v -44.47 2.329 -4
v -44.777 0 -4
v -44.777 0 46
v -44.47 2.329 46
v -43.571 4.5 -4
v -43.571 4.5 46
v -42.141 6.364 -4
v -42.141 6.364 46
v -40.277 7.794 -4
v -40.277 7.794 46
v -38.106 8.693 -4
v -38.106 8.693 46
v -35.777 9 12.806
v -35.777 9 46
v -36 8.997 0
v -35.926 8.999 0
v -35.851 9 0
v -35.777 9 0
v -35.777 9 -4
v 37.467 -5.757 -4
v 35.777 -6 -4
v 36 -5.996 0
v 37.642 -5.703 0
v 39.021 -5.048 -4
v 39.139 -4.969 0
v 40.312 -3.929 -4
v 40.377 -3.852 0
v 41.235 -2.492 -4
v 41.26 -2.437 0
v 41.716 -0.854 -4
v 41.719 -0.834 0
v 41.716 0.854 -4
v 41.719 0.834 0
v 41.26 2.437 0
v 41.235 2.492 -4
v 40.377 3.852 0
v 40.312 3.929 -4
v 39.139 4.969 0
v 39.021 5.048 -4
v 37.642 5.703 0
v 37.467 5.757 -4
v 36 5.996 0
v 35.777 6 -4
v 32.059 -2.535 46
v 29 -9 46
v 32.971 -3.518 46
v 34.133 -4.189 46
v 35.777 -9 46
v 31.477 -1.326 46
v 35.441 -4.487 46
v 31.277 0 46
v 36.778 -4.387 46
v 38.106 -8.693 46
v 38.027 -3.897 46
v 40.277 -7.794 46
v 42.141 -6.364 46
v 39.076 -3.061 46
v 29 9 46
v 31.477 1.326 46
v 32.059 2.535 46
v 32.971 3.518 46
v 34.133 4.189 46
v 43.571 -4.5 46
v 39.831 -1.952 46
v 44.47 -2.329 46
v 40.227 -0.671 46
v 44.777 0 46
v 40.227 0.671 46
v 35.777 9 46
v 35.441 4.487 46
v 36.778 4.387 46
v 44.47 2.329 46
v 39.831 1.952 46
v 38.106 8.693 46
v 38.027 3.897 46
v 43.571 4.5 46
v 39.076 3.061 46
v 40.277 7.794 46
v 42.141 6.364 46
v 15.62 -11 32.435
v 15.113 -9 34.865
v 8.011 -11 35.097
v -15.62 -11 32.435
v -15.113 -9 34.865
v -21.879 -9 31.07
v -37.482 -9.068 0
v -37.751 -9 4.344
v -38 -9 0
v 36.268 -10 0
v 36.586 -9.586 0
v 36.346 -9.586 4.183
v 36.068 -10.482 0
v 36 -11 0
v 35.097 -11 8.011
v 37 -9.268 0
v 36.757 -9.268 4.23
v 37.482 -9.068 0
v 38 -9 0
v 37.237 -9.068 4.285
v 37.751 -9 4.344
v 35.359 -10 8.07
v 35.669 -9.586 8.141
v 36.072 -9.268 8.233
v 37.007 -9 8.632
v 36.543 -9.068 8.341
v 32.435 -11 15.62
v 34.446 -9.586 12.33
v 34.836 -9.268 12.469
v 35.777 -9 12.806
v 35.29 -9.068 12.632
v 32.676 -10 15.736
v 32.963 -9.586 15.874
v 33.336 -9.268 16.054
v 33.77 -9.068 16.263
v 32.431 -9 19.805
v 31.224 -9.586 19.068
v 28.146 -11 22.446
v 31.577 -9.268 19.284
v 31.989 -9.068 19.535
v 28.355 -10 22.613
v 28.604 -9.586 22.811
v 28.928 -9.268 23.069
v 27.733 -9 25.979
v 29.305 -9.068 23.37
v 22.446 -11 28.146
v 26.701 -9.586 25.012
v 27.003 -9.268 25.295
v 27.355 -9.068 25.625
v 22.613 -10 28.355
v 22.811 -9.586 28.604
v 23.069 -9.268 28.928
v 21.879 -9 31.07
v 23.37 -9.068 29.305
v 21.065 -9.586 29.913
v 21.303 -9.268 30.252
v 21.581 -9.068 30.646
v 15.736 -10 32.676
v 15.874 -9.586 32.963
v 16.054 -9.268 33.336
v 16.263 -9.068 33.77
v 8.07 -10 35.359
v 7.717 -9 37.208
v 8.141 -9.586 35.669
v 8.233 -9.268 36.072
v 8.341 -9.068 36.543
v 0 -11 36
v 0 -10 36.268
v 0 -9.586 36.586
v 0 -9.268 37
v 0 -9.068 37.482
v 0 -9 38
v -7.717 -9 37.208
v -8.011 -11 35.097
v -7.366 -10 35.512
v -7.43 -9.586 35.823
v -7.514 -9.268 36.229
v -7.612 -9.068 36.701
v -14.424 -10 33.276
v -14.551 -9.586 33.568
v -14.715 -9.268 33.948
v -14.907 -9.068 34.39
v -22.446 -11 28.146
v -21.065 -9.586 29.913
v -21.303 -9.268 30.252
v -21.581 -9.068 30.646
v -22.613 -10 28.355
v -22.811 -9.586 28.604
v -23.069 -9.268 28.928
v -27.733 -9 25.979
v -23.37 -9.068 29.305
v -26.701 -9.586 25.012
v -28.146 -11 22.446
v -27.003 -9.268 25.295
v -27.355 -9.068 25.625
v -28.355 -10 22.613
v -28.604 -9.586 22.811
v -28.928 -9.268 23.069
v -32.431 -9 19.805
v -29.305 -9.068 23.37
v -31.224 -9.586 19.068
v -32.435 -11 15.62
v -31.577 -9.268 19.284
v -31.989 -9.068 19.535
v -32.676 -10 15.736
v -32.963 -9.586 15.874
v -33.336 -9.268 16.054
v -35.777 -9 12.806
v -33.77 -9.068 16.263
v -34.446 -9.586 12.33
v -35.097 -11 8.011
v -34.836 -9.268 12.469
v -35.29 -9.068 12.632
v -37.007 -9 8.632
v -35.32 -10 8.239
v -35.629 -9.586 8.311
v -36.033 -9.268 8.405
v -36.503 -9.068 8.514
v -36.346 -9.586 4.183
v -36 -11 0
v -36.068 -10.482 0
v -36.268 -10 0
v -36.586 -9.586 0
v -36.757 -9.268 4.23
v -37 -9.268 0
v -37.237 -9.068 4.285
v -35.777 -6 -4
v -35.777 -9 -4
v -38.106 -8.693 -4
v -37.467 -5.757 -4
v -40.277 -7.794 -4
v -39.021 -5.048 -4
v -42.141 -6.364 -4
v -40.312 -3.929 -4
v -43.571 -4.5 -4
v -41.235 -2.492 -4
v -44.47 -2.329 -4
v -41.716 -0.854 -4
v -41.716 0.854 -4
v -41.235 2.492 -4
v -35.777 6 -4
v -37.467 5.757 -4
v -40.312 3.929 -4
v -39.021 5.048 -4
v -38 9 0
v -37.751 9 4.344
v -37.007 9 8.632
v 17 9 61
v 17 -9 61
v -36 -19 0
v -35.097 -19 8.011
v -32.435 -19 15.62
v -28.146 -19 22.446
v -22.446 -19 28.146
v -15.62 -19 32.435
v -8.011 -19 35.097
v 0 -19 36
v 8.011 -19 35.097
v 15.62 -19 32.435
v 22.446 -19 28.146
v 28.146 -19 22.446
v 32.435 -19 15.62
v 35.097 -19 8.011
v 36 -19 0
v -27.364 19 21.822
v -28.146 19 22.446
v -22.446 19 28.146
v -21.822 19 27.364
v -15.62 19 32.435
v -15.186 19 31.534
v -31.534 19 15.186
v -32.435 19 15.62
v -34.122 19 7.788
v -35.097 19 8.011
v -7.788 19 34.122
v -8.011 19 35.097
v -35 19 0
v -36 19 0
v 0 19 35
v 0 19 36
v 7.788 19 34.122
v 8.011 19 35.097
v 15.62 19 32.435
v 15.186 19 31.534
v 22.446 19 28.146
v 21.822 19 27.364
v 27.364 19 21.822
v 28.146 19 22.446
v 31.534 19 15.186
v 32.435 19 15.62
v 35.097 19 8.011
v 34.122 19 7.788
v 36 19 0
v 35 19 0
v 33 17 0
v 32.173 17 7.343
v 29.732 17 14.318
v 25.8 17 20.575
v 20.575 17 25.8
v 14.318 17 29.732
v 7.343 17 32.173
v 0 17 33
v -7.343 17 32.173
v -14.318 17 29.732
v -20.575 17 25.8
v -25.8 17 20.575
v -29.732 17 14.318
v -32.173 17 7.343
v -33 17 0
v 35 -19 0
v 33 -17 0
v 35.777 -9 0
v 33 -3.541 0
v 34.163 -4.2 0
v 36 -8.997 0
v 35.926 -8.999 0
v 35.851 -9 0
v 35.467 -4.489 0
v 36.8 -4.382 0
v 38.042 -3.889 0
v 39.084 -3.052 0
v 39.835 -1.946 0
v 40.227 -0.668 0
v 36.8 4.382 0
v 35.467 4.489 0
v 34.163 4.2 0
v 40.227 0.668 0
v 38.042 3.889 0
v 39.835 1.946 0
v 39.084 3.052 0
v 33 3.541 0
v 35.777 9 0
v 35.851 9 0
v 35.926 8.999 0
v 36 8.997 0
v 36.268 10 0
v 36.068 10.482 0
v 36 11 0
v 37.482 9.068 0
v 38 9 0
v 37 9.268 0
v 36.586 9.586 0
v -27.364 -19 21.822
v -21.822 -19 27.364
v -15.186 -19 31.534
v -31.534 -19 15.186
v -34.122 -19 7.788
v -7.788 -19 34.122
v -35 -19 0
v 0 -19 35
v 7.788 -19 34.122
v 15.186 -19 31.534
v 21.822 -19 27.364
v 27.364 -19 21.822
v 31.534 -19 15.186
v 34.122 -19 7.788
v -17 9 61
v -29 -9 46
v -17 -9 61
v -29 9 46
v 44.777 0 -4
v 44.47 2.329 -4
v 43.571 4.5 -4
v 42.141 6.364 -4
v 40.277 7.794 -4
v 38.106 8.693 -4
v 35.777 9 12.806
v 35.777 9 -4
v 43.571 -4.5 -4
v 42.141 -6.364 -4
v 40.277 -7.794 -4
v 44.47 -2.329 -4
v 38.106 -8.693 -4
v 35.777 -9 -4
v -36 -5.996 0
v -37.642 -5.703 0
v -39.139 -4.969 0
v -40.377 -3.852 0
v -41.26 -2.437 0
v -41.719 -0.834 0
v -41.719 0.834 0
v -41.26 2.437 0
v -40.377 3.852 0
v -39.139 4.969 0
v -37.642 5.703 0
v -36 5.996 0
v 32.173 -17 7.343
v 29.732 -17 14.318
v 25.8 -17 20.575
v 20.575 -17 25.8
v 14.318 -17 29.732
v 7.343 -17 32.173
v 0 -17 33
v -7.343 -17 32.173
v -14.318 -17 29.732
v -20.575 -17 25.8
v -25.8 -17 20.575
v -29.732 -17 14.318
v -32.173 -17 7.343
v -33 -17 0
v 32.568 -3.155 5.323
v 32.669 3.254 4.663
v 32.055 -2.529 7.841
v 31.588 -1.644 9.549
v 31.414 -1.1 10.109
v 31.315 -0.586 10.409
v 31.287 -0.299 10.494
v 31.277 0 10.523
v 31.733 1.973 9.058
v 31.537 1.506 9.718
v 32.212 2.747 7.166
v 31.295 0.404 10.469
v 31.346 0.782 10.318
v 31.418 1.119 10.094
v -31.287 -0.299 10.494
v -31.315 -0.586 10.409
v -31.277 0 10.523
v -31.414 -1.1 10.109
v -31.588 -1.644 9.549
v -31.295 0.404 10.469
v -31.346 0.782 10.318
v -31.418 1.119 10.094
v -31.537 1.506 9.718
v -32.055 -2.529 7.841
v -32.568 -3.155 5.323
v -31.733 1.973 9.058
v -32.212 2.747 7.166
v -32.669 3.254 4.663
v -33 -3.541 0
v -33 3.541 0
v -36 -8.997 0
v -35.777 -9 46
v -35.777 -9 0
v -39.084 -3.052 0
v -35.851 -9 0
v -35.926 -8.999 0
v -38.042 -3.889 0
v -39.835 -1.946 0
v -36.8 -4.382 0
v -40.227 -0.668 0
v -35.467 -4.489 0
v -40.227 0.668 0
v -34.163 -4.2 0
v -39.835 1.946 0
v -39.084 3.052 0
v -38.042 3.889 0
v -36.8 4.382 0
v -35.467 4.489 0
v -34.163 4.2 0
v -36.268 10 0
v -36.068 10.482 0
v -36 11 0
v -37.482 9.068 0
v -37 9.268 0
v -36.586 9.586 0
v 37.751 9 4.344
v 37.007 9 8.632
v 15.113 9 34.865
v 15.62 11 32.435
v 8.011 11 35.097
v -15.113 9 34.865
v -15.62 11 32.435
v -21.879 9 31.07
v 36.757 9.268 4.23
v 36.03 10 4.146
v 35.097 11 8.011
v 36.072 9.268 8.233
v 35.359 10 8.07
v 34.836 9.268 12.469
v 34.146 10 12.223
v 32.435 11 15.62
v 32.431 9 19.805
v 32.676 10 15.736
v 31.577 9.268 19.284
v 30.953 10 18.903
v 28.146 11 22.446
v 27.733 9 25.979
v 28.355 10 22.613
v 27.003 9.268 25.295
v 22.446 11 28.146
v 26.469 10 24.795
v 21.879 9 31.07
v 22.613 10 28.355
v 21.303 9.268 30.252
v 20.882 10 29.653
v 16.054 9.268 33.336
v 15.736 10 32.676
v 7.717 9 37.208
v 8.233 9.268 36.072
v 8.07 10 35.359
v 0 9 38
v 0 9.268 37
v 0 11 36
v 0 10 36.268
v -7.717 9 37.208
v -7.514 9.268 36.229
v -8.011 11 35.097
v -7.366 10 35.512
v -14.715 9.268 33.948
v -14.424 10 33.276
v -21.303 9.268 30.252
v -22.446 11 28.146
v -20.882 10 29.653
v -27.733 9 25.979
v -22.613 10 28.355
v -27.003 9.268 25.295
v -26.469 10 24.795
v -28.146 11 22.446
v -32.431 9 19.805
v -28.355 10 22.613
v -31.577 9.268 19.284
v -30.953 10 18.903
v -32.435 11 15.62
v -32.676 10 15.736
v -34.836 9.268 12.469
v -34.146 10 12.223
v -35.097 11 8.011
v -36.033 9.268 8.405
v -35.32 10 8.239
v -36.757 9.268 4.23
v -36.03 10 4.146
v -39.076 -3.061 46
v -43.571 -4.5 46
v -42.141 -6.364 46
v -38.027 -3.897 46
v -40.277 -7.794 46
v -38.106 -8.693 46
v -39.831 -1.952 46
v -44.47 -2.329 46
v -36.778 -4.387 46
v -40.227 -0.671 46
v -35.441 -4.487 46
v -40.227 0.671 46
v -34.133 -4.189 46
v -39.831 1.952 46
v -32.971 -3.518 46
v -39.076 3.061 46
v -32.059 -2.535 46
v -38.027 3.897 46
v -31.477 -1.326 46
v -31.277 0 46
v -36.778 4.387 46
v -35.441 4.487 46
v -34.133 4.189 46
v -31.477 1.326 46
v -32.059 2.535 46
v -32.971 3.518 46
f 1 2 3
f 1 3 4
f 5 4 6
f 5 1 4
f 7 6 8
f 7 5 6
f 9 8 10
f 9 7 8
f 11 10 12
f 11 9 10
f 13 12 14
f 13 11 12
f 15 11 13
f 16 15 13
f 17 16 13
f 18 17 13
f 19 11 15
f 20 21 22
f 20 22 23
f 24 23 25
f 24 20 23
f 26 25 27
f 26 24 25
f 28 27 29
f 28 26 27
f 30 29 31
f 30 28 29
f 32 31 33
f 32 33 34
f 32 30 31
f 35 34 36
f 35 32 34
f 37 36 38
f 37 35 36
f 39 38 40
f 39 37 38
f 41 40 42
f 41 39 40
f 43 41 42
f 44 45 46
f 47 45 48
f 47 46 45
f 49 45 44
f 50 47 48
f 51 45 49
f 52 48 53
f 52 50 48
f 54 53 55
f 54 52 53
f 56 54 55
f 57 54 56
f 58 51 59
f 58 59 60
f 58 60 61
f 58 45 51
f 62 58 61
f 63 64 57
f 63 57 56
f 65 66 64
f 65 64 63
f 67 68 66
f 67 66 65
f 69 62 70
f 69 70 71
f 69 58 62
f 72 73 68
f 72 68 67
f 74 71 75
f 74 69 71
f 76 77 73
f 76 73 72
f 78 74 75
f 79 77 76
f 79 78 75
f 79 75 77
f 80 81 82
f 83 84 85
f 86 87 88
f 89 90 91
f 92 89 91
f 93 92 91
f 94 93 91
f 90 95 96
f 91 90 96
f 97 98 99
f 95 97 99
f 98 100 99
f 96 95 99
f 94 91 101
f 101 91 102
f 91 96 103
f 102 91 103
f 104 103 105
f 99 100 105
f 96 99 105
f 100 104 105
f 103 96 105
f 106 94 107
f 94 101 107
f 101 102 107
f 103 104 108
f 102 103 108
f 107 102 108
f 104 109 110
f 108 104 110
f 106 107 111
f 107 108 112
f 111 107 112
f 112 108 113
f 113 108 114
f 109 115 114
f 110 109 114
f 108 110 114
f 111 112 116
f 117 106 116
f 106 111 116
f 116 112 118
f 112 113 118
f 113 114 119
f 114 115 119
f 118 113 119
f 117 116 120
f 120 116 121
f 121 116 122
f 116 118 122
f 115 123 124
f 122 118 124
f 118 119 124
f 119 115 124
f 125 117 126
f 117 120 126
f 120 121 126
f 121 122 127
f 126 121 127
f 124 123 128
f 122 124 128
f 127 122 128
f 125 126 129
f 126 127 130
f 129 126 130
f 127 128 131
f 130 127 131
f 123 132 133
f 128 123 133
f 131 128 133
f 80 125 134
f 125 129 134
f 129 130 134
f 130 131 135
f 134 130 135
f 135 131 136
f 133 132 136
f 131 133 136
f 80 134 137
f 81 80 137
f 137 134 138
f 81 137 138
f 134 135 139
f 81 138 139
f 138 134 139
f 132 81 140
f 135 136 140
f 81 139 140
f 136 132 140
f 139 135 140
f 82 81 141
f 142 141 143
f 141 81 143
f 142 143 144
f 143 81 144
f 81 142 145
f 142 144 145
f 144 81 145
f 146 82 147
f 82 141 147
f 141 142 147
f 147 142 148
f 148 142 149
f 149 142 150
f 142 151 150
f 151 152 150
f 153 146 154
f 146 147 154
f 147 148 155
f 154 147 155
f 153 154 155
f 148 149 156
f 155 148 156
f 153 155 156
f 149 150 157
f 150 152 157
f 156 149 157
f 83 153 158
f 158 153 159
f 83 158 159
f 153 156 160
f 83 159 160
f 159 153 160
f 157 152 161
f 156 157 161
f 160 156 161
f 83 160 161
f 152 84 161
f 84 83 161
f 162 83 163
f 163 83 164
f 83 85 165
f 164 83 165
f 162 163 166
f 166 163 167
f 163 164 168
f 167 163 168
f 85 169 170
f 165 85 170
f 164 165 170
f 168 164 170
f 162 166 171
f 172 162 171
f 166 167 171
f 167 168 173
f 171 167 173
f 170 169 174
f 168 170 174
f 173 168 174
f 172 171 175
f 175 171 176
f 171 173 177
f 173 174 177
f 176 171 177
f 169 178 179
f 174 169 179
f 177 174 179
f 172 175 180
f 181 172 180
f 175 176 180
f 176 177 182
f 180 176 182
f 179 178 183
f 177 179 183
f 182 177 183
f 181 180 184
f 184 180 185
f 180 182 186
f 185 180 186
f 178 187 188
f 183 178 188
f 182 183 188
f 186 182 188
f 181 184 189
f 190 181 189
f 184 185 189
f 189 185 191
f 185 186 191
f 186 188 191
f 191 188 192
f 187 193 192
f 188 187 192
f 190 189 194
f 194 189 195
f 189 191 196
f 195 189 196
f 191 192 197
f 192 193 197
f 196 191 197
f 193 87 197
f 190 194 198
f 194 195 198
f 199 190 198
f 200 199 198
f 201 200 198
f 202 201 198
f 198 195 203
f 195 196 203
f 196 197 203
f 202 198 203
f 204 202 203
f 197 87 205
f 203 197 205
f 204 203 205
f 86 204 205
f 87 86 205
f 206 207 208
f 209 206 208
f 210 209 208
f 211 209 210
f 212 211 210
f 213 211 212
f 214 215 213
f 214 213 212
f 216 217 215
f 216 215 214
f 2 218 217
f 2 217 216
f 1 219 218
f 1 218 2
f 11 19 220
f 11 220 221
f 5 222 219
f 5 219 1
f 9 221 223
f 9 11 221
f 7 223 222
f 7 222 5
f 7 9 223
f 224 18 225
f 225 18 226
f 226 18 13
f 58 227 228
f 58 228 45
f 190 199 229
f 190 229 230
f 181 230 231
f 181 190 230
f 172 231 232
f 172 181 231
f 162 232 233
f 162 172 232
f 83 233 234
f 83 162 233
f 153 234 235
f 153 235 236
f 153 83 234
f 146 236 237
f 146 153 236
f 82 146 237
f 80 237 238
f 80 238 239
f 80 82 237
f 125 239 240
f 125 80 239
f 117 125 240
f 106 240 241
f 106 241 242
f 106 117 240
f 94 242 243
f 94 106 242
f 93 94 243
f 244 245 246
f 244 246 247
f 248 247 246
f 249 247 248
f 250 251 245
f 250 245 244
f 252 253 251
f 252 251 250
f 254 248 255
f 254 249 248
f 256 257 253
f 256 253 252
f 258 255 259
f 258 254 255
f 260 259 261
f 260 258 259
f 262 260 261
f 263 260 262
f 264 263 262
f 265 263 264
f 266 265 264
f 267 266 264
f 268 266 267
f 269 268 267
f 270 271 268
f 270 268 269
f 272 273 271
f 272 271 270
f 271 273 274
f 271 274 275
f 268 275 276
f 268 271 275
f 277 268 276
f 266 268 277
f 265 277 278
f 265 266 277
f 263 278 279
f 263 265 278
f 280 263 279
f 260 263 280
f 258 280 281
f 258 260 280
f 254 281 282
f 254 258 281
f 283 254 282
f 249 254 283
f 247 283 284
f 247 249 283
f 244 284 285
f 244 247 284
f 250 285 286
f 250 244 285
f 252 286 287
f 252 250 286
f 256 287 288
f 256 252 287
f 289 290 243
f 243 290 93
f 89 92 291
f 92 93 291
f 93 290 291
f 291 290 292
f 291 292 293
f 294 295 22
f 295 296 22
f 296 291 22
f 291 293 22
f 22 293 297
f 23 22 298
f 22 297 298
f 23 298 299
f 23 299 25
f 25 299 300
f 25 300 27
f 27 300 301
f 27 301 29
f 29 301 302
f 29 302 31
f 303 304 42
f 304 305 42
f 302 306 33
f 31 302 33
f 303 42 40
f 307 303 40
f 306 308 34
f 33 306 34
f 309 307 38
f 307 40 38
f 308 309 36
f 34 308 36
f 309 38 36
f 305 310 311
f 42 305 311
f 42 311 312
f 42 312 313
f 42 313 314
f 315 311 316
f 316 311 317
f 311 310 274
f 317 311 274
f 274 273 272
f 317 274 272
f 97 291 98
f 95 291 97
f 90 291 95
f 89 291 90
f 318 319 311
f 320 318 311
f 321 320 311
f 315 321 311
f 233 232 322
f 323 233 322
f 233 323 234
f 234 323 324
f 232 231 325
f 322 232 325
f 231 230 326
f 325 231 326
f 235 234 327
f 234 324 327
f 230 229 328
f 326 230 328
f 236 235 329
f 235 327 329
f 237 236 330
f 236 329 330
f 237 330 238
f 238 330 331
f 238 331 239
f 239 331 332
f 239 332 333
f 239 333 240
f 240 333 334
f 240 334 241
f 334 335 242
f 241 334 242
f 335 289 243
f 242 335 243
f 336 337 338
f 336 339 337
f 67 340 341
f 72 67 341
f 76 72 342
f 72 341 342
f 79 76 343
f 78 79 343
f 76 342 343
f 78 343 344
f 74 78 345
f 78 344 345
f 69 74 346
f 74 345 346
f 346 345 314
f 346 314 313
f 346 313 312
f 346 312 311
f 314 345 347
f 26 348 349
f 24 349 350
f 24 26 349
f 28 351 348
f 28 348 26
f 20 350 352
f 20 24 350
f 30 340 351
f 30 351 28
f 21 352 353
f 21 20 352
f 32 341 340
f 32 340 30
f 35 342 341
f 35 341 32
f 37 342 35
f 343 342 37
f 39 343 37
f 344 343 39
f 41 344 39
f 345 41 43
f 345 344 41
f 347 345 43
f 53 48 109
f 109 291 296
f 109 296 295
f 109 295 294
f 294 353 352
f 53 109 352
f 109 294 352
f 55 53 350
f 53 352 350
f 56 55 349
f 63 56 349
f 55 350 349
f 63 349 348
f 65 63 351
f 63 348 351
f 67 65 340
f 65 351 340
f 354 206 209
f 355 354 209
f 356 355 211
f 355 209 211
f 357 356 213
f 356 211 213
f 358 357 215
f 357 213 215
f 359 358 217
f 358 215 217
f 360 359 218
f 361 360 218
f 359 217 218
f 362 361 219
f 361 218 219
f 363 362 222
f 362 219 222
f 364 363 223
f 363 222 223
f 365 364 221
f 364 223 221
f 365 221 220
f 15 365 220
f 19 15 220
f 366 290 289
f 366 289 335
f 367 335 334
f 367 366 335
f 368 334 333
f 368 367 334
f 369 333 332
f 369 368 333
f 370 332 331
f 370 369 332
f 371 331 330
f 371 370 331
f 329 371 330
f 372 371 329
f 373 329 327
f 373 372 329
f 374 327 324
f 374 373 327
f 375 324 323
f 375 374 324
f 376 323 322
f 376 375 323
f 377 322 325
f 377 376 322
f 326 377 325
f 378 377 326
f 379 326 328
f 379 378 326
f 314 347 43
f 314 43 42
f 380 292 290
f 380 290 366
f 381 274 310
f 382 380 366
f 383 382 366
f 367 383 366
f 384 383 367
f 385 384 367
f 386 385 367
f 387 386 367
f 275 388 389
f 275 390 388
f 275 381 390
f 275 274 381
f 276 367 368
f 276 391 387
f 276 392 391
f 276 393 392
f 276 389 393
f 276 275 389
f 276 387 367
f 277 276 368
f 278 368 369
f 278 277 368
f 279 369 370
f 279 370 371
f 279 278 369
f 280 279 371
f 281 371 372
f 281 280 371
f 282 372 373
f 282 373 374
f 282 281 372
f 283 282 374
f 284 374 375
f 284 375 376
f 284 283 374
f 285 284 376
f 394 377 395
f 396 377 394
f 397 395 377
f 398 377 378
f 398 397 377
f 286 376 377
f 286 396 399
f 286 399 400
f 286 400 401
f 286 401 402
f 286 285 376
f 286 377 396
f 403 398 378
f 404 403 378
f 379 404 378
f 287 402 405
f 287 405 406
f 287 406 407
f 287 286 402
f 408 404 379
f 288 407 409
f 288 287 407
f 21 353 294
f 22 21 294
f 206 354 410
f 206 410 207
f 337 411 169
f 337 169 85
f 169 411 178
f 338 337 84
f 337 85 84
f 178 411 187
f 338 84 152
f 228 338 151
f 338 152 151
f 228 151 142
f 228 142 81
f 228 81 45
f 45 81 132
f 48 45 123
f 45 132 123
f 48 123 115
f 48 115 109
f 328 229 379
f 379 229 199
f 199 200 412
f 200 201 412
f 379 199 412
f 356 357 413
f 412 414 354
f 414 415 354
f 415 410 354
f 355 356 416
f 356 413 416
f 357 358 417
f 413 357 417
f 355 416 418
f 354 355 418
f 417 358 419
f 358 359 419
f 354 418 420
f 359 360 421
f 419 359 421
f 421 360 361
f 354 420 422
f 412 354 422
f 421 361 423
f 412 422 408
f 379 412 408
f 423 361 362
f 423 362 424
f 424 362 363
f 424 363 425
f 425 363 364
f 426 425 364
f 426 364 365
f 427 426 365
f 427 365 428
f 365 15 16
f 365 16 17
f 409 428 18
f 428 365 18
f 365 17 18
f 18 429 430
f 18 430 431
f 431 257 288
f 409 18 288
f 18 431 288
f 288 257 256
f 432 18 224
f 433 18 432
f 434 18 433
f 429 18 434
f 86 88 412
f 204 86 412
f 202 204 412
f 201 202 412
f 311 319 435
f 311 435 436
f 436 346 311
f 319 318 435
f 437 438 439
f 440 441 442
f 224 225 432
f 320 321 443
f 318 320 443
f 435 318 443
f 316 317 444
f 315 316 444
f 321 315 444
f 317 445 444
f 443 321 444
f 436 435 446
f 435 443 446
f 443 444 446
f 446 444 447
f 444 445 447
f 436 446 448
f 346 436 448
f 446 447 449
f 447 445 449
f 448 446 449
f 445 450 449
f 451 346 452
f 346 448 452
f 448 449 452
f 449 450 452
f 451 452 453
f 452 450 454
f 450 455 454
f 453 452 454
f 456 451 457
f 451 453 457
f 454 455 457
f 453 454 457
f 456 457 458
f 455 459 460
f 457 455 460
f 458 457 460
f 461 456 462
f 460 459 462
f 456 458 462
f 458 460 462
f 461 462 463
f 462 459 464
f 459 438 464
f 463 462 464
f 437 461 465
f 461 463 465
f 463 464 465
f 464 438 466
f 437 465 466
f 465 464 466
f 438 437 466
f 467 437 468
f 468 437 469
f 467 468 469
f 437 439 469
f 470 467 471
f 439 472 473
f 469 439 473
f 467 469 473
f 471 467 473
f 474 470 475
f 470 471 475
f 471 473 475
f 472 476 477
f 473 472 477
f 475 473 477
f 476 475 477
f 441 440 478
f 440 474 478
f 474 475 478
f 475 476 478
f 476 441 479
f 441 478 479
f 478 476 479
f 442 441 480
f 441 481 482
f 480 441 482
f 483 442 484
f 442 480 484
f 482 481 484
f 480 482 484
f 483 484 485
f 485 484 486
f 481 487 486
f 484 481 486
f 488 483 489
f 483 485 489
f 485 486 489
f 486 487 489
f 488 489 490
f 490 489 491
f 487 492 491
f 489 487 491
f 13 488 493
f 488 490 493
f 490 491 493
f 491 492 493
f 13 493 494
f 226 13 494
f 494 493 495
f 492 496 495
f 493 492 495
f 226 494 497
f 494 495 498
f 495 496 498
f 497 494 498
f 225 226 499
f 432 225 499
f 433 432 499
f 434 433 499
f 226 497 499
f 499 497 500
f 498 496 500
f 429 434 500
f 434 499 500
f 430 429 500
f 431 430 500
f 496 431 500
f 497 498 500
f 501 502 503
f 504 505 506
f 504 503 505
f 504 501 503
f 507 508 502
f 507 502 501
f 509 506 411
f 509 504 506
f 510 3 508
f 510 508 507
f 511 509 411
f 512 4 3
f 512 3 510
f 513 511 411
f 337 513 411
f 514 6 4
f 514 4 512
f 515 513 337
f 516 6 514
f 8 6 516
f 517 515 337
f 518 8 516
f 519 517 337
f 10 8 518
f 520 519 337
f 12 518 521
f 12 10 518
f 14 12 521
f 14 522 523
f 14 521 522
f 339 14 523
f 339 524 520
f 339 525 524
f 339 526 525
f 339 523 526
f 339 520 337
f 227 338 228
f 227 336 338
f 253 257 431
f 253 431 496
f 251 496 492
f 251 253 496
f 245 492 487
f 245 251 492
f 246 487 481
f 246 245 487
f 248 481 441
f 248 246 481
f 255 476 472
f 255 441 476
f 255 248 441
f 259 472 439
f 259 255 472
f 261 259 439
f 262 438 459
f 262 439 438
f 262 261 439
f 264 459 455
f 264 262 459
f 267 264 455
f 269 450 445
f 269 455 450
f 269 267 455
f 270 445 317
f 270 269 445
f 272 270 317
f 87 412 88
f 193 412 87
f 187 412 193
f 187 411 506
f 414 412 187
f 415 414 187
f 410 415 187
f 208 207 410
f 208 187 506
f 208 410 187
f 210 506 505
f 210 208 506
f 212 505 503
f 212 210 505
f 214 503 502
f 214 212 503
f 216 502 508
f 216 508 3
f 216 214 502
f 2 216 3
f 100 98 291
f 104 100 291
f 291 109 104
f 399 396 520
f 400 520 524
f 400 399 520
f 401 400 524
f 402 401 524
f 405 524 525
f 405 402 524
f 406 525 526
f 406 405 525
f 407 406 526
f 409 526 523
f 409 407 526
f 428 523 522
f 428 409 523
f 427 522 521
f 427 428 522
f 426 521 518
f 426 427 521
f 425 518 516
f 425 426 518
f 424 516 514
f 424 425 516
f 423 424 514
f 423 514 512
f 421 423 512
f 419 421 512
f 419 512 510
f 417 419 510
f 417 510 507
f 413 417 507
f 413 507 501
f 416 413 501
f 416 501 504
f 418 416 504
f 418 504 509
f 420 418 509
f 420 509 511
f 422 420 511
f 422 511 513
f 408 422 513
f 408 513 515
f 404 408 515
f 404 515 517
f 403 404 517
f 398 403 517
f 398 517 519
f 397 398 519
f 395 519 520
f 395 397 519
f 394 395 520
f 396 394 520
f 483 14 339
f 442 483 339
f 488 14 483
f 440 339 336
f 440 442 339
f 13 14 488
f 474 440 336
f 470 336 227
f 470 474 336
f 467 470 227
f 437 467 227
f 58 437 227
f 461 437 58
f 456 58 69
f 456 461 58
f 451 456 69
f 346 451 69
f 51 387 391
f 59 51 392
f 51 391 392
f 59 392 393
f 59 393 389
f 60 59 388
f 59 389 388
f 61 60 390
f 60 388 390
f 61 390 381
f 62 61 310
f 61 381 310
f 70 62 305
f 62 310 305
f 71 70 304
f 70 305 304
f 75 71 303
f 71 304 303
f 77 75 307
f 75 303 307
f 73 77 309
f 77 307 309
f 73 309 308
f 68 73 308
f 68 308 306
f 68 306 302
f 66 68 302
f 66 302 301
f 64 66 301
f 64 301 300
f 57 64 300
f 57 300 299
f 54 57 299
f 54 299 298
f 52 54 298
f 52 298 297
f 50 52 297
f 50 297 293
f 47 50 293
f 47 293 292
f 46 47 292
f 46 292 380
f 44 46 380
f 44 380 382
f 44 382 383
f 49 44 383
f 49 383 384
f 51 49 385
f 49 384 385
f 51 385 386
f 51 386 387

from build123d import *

# Parameters (mm, degrees)
BOSS_EXTRUDE2_DEPTH = 9
BOSS_EXTRUDE3_DEPTH = 19
CHAMFER1_SIZE       = 2
CUT_EXTRUDE1_DEPTH  = 50
SKETCH6_R           = 4.5
CUT_EXTRUDE2_DEPTH  = 50
CUT_EXTRUDE3_DEPTH  = 4
FILLET1_R           = 2


with BuildPart() as part:
    # Sketch1 → Boss-Extrude2 (new, symmetric)
    with BuildSketch(Plane(origin=(0, 0, 0), x_dir=(1, 0, 0), z_dir=(0, 1, 0))):
        with BuildLine():
            Line((-17, -61), (17, -61))
            Line((17, -61), (29, -46))
            Line((29, -46), (44.77708764, -46))
            Line((44.77708764, -46), (44.77708764, 4))
            Line((44.77708764, 4), (35.77708764, 4))
            ThreePointArc((35.77708764, 4), (0, -36), (-35.77708764, 4))
            Line((-35.77708764, 4), (-44.77708764, 4))
            Line((-44.77708764, 4), (-44.77708764, -46))
            Line((-44.77708764, -46), (-29, -46))
            Line((-29, -46), (-17, -61))
        make_face()
    extrude(amount=BOSS_EXTRUDE2_DEPTH, both=True)

    # Sketch3 → Boss-Extrude3 (add, symmetric)
    with BuildSketch(Plane(origin=(0, 0, 0), x_dir=(1, 0, 0), z_dir=(0, 1, 0))):
        with BuildLine():
            Line((36, 0), (33, 0))
            ThreePointArc((33, 0), (0, -33), (-33, 0))
            Line((-33, 0), (-36, 0))
            ThreePointArc((-36, 0), (0, -36), (36, 0))
        make_face()
    extrude(amount=BOSS_EXTRUDE3_DEPTH, both=True)

    # Chamfer1
    chamfer1_edges = [part.edges().sort_by_distance(p)[0] for p in [
        (0, -19, 33),
        (0, 19, 33),
    ]]
    chamfer(chamfer1_edges, length=CHAMFER1_SIZE)

    # Sketch5 → Cut-Extrude1 (cut)
    with BuildSketch(Plane(origin=(0, 0, -4), x_dir=(-1, 0, 0), z_dir=(0, 0, -1))):
        with BuildLine():
            ThreePointArc((-44.77708764, -4.1e-08), (-42.141048685, 6.363961016), (-35.77708764, 9))
            Line((-35.77708764, 9), (-44.77708764, 9))
            Line((-44.77708764, 9), (-44.77708764, -4.1e-08))
        make_face()
        with BuildLine():
            ThreePointArc((-35.77708764, -9), (-42.141048656, -6.363961045), (-44.77708764, -4.1e-08))
            Line((-44.77708764, -4.1e-08), (-44.77708764, -9))
            Line((-44.77708764, -9), (-35.77708764, -9))
        make_face()
    cut_extrude1 = extrude(amount=-CUT_EXTRUDE1_DEPTH, mode=Mode.SUBTRACT)

    # Sketch6 → Cut-Extrude2 (cut)
    with BuildSketch(Plane(origin=(0, 0, -4), x_dir=(-1, 0, 0), z_dir=(0, 0, -1))):
        with Locations((-35.77708764, 0)):
            Circle(SKETCH6_R)
    cut_extrude2 = extrude(amount=-CUT_EXTRUDE2_DEPTH, mode=Mode.SUBTRACT)

    # Sketch7 → Cut-Extrude3 (cut)
    with BuildSketch(Plane(origin=(0, 0, -4), x_dir=(-1, 0, 0), z_dir=(0, 0, -1))):
        with BuildLine():
            Line((-35.77708764, 6), (-35.77708764, 4.5))
            ThreePointArc((-35.77708764, 4.5), (-40.27708764, 0), (-35.77708764, -4.5))
            Line((-35.77708764, -4.5), (-35.77708764, -6))
            ThreePointArc((-35.77708764, -6), (-41.77708764, 0), (-35.77708764, 6))
        make_face()
    cut_extrude3 = extrude(amount=-CUT_EXTRUDE3_DEPTH, mode=Mode.SUBTRACT)

    # Mirror2: Cut-Extrude1, Cut-Extrude2, Cut-Extrude3 across plane
    add(cut_extrude1.mirror(Plane(origin=(0, 0, 0), x_dir=(0, 0, 1), z_dir=(1, 0, 0))), mode=Mode.SUBTRACT)
    add(cut_extrude2.mirror(Plane(origin=(0, 0, 0), x_dir=(0, 0, 1), z_dir=(1, 0, 0))), mode=Mode.SUBTRACT)
    add(cut_extrude3.mirror(Plane(origin=(0, 0, 0), x_dir=(0, 0, 1), z_dir=(1, 0, 0))), mode=Mode.SUBTRACT)

    # Fillet1
    # the kernel refuses this fillet: 2 mm, written as the material it adds along each edge
    with BuildSketch(Plane(origin=(0, -9, 0), x_dir=(0.9996152524995429, 0, -0.027737104576279894), z_dir=(-0.027737104576279894, 0, -0.9996152524995429))) as fillet1_piece_1_section:
        with BuildLine():
            CenterArc((36 + FILLET1_R, FILLET1_R), FILLET1_R, 180, 90)
            Line((36, FILLET1_R), (36, 0))
            Line((36, 0), (36 + FILLET1_R, 0))
        make_face()
    fillet1_piece_1 = revolve(axis=Axis((0, -9, 0), (0, -1, 0)), revolution_arc=183.178845751, mode=Mode.PRIVATE)
    fillet1_piece_1 = split(fillet1_piece_1, bisect_by=Plane(origin=(0, -9, 0), z_dir=(0, 0, 1)), keep=Keep.TOP, mode=Mode.PRIVATE)
    add(fillet1_piece_1)
    with BuildSketch(Plane(origin=(0, 9, 0), x_dir=(0.9996152524995429, 0, -0.027737104576279894), z_dir=(-0.027737104576279894, 0, -0.9996152524995429))) as fillet1_piece_2_section:
        with BuildLine():
            CenterArc((36 + FILLET1_R, -FILLET1_R), FILLET1_R, 90, 90)
            Line((36, -FILLET1_R), (36, 0))
            Line((36, 0), (36 + FILLET1_R, 0))
        make_face()
    fillet1_piece_2 = revolve(axis=Axis((0, 9, 0), (0, -1, 0)), revolution_arc=183.178845751, mode=Mode.PRIVATE)
    fillet1_piece_2 = split(fillet1_piece_2, bisect_by=Plane(origin=(0, 9, 0), z_dir=(0, 0, 1)), keep=Keep.TOP, mode=Mode.PRIVATE)
    add(fillet1_piece_2)


solid = part.part
